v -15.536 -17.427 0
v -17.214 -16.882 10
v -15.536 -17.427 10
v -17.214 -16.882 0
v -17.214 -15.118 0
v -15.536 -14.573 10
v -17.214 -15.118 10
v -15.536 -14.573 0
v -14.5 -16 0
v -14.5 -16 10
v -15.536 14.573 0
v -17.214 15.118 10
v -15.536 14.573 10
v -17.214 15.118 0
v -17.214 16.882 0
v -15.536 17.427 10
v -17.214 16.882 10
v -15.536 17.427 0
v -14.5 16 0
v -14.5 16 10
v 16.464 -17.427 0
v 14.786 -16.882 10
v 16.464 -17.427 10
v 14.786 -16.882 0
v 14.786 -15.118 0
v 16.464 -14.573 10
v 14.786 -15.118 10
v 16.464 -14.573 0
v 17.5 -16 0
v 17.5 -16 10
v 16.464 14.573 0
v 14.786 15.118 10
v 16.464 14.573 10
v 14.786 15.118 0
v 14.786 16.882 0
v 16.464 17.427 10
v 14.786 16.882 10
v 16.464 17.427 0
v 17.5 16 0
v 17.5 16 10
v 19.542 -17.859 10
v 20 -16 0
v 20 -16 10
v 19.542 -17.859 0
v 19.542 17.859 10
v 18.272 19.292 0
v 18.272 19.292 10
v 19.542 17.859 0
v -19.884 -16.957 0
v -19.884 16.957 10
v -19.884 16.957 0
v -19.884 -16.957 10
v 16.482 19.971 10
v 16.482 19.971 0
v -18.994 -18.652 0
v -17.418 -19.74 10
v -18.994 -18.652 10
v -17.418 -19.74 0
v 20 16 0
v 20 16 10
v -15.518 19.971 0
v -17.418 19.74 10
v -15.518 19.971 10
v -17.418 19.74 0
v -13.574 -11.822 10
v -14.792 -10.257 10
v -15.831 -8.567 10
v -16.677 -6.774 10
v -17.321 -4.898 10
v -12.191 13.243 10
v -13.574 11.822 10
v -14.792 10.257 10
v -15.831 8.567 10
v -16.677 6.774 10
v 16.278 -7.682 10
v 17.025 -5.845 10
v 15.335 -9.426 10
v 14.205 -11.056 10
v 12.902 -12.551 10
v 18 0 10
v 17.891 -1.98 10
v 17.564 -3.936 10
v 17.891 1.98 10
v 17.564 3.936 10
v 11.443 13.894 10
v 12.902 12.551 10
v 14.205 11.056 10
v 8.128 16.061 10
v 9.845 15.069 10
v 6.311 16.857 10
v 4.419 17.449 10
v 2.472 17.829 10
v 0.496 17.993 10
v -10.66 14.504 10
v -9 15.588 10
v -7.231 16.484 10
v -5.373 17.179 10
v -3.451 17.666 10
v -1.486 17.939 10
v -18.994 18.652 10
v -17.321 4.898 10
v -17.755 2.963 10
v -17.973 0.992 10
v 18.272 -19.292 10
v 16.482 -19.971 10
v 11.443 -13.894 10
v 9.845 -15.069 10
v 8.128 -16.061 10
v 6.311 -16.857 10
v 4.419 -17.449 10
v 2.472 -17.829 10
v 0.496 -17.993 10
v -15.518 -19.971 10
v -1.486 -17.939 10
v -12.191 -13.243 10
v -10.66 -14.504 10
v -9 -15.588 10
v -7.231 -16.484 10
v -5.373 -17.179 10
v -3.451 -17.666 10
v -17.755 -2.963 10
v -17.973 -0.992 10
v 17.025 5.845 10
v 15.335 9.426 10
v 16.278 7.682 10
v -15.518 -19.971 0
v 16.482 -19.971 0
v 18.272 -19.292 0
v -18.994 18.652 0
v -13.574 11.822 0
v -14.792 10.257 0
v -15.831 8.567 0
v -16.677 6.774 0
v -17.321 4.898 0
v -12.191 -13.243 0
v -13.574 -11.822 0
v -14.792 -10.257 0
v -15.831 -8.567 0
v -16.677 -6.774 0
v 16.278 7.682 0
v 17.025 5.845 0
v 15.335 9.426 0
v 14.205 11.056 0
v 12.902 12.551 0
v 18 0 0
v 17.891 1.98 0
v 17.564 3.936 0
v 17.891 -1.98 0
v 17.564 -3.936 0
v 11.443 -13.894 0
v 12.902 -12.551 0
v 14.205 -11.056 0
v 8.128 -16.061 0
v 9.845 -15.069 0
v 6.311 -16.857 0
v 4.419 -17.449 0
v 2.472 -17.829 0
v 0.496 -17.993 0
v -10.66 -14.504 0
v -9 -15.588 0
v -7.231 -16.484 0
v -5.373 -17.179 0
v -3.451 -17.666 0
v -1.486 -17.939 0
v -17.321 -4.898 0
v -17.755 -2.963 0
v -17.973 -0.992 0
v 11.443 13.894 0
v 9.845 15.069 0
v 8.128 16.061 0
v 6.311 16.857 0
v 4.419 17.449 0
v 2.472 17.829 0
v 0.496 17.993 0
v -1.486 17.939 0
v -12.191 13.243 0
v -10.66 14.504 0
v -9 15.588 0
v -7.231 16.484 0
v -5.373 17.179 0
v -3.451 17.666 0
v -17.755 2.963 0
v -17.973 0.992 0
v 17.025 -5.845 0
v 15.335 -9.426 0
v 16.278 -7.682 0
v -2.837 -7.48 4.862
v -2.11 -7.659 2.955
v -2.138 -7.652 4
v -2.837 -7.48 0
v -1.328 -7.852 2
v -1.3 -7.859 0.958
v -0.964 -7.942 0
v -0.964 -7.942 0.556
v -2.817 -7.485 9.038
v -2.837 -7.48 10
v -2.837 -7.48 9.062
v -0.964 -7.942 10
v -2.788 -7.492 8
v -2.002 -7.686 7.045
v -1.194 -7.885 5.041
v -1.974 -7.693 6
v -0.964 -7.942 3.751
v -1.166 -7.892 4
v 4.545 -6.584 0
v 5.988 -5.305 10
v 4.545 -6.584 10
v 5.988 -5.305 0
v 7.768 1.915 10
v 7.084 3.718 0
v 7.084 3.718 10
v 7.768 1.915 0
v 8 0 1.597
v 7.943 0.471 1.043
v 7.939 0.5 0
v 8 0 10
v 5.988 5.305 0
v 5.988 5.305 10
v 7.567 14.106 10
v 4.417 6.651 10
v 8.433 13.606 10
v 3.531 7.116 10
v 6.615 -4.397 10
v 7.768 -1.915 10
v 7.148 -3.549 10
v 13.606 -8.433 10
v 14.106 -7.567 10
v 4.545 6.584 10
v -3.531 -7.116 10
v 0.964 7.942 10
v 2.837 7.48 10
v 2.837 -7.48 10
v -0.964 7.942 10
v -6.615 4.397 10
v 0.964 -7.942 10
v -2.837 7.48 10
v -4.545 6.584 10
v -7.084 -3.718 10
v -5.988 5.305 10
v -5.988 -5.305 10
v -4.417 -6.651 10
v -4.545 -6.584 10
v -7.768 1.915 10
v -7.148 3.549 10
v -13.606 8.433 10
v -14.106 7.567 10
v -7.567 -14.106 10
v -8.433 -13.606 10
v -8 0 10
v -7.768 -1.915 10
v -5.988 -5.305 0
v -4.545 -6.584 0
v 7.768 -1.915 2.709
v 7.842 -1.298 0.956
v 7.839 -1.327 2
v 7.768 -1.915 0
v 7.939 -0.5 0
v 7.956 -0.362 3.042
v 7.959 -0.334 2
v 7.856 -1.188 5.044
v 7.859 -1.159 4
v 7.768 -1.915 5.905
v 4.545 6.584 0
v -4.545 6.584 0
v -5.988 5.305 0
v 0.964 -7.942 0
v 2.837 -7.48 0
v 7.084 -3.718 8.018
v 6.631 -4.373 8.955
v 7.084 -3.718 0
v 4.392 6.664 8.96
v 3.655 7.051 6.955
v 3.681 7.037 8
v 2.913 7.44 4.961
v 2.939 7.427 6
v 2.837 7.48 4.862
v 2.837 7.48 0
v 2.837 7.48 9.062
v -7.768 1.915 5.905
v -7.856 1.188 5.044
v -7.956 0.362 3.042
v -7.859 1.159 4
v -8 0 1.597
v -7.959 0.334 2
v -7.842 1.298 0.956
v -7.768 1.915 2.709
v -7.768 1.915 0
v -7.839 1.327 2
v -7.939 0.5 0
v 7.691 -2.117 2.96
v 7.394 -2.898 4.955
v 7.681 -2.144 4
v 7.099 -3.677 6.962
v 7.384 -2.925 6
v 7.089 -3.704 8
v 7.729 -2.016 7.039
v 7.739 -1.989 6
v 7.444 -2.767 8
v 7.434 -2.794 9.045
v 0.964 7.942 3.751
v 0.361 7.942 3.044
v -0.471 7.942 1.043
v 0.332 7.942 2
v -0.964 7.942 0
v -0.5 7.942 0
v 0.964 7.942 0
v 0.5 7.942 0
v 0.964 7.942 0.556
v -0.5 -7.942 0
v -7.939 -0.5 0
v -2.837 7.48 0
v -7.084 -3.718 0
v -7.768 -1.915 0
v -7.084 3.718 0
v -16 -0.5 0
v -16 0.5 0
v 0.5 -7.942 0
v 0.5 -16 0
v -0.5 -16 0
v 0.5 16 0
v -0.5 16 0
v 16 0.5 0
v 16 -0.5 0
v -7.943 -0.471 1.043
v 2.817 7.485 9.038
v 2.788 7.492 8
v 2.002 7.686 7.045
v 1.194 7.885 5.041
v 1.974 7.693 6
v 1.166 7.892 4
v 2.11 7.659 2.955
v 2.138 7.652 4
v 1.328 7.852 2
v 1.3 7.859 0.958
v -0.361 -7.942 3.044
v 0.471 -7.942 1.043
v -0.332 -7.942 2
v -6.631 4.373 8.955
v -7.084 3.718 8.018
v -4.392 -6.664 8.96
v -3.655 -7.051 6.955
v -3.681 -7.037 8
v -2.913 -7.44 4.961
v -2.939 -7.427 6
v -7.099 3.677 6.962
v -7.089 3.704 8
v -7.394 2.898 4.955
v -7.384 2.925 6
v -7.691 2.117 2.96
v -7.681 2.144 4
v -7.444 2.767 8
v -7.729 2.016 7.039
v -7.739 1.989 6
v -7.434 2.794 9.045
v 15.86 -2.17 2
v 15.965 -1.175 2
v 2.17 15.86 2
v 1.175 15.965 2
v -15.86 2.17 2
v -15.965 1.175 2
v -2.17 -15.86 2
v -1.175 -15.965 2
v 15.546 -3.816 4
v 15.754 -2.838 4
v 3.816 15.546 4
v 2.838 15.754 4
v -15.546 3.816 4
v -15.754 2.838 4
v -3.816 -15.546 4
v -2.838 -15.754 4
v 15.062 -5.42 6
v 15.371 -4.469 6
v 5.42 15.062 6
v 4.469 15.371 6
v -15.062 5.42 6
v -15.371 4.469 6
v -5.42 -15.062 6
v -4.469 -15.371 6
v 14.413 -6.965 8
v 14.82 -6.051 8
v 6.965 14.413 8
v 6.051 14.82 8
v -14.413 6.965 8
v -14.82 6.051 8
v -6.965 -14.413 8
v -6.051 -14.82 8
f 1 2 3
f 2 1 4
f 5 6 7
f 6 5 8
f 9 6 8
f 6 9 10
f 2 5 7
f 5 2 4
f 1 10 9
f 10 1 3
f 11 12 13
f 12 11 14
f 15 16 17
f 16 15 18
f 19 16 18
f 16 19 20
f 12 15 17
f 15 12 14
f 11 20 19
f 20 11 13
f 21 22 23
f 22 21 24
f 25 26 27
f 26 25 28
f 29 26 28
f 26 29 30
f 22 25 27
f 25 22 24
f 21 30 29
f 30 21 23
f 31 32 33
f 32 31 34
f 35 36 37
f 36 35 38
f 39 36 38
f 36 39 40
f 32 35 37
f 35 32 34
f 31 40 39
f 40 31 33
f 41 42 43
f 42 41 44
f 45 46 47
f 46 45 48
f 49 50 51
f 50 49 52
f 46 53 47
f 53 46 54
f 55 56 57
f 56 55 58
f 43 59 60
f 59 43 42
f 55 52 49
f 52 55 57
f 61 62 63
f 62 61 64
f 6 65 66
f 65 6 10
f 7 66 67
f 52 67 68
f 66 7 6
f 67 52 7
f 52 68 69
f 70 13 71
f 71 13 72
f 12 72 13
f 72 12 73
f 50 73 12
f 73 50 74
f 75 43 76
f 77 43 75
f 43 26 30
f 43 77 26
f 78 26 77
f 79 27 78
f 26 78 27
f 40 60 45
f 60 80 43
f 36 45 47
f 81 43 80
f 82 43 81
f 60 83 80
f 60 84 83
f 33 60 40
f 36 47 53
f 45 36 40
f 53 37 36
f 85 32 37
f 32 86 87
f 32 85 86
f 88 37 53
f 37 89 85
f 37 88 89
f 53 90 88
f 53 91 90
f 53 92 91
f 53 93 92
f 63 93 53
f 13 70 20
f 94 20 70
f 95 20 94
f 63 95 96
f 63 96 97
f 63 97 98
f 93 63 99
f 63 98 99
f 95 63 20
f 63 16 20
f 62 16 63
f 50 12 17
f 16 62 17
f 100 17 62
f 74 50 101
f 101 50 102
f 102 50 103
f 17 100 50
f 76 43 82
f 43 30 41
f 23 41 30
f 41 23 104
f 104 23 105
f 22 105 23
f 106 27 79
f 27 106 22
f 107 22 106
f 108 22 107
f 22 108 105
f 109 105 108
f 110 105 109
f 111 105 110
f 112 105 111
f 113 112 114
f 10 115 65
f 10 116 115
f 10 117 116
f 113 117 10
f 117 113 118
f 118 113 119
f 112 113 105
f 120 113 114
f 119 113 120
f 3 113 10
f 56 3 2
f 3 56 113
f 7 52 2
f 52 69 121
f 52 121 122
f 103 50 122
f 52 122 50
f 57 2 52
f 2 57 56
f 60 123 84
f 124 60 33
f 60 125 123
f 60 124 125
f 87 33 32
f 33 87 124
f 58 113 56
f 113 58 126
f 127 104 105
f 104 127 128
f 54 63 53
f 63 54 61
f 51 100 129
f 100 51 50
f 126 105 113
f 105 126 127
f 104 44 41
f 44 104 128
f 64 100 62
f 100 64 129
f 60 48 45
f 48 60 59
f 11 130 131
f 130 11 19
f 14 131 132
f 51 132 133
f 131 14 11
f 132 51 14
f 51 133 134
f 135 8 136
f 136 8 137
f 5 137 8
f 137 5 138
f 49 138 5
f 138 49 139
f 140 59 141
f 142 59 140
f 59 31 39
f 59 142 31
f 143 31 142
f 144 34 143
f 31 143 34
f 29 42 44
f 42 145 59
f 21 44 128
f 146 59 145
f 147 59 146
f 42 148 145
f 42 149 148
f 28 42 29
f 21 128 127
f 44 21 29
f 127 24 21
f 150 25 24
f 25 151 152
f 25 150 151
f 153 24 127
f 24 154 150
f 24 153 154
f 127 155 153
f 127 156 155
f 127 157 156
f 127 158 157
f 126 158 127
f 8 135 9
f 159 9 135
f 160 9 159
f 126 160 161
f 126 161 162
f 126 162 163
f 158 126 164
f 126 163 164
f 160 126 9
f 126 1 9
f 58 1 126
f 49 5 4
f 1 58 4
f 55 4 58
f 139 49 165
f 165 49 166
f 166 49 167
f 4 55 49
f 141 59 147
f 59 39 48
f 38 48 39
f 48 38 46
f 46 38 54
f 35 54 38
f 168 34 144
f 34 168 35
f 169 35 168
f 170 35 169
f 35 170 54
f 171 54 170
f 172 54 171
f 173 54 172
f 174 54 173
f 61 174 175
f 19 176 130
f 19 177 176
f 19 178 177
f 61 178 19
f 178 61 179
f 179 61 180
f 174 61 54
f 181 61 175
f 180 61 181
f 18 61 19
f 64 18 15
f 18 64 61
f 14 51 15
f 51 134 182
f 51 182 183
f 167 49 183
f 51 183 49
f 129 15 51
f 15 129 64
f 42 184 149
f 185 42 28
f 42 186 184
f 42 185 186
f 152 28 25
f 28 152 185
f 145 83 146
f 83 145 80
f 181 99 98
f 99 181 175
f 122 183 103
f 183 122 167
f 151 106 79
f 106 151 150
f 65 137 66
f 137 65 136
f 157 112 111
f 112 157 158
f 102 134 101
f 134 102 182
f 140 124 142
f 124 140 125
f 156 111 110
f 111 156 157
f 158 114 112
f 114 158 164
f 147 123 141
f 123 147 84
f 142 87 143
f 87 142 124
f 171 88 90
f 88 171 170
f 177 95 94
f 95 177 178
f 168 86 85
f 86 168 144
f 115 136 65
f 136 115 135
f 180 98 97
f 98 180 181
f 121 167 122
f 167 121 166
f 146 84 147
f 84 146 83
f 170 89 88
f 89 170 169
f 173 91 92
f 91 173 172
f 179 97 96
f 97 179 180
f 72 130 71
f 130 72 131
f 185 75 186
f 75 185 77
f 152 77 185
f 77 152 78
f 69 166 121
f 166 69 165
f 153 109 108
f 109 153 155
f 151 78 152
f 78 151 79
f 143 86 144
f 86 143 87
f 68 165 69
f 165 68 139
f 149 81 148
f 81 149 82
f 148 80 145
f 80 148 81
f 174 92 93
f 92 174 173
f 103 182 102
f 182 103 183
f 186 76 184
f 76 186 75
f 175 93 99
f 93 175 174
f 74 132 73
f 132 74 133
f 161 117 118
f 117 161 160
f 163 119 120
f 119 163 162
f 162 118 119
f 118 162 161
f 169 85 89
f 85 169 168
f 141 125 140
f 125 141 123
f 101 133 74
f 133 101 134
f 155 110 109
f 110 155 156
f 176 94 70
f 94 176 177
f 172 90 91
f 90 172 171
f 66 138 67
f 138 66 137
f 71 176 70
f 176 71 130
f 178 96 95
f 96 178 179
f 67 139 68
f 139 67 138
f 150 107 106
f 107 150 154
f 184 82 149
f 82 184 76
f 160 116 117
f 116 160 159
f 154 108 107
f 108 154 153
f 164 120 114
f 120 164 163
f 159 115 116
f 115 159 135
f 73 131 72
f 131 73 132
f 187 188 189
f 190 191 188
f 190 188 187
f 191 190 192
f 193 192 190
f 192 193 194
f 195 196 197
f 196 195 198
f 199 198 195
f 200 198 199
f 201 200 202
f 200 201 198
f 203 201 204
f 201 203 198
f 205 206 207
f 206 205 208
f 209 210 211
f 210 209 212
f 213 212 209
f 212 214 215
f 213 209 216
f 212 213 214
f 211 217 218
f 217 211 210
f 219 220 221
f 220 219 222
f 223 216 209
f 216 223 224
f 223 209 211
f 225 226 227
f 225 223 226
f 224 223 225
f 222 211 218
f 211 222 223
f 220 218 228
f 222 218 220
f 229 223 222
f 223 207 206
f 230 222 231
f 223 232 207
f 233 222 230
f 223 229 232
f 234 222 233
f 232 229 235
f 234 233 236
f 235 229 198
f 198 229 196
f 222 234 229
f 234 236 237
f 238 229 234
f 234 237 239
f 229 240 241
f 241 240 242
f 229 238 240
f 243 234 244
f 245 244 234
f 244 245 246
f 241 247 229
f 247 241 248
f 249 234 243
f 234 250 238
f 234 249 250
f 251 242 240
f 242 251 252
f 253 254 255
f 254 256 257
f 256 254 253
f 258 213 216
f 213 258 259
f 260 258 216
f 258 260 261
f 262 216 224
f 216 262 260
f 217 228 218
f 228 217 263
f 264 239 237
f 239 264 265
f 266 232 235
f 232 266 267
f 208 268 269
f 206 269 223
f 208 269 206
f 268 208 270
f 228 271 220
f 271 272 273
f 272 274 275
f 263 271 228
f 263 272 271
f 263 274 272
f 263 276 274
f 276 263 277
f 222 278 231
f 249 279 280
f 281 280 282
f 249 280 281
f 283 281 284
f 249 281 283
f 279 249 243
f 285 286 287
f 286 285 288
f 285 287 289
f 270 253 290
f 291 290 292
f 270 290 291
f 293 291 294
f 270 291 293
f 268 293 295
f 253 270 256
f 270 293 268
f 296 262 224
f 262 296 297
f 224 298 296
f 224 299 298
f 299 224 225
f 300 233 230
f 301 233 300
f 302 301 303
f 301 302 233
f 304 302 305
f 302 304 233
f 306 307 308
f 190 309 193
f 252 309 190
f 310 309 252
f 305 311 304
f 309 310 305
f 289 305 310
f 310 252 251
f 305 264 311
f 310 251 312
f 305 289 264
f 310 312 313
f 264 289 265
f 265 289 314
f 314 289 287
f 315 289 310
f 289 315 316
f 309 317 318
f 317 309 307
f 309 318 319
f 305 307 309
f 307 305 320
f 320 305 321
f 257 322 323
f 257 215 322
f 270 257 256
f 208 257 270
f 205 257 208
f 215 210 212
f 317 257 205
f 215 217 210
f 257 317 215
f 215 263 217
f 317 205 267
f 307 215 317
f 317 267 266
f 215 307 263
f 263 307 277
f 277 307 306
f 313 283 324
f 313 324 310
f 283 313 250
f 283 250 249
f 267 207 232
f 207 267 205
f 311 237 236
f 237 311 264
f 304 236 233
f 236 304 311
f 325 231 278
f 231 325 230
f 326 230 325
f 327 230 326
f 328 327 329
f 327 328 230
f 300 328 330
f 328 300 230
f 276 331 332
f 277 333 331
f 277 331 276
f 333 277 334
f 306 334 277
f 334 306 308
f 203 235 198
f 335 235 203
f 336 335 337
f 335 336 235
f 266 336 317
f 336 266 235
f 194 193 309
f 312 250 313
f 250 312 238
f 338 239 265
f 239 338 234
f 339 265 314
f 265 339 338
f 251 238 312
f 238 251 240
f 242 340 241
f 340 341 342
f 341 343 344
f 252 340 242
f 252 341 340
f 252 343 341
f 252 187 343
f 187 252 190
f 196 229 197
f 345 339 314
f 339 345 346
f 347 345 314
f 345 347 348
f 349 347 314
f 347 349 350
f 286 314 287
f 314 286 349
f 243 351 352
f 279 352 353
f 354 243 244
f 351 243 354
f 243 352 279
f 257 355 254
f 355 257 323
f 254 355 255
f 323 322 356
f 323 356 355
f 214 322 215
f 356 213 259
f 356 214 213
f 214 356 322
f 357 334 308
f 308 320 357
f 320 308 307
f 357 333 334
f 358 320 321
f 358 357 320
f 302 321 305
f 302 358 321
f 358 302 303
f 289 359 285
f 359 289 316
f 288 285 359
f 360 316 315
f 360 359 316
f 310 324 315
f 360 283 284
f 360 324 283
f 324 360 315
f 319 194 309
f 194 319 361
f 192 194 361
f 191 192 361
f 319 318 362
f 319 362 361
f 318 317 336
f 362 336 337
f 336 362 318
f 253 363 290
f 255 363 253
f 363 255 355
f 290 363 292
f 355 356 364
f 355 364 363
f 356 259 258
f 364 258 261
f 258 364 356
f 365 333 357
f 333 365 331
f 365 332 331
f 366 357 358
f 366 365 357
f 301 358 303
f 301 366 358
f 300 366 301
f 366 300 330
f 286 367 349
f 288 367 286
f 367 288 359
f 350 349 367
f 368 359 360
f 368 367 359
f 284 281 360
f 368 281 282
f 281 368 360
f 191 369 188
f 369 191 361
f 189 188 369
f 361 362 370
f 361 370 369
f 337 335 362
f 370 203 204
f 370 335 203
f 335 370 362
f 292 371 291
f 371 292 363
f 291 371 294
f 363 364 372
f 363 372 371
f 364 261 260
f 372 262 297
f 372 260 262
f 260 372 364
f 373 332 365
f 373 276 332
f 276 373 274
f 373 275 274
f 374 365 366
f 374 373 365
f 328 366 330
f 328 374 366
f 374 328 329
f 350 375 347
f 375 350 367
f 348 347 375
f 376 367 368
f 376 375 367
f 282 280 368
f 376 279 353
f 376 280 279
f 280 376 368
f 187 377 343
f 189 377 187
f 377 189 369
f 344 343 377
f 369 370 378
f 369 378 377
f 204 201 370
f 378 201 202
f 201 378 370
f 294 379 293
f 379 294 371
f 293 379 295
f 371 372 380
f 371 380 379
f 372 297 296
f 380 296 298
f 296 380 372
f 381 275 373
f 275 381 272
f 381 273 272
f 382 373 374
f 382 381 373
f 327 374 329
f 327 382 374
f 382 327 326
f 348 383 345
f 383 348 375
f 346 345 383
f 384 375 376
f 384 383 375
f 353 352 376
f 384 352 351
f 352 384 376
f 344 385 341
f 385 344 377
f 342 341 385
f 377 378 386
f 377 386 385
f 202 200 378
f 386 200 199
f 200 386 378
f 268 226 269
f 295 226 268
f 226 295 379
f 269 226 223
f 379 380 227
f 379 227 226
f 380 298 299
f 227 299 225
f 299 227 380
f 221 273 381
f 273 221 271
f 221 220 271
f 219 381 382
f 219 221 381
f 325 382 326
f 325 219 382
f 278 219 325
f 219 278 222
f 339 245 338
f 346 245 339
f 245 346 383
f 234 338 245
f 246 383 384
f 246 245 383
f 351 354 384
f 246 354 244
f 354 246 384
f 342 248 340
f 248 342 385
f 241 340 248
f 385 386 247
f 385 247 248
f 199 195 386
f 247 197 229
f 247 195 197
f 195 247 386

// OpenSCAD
// file: ../machine.scad
/*
 * Helpers for machinging; i.e. kerf alowances
 *
 * Copyright 2013 <b@Zi.iS>
 * License CC BY 3.0
 */

include <main.scad>;

ZCUT = 0;
XOFF = 0;
YOFF = 0;

module drawing() {
	//create blueprint
	if(preview==0) {
		projection(cut=true) translate([
			XOFF,
			YOFF,
			ZCUT
		]) {
			for(i=[0:$children-1]) child(i);
		}
	} else {
		for(i=[0:$children-1]) child(i);
	}
}

module kerf_cube(
	size
) {
	translate([
		kerf/2*(1-preview),
		kerf/2*(1-preview),
		0
	]) {
		cube([
			size[0] - kerf*(1-preview),
			size[1] - kerf*(1-preview),
			size[2]
		]);
	}
}

module kerf_cylinder(
	r,
	h
) {
	cylinder(
		r = r - kerf/2*(1-preview),
		h = h
	);
}

module part(
	id,
	name
) {
	if(PART<1 || PART==id) {
		if(id>=0) echo(str("PART", id, ":", name));
		for(i=[0:$children-1]) child(i);
	}	
}
// file: ../easing.scad
/*
 * Make allowances to ensure good fit.
 *
 * Copyright 2013 <b@Zi.iS>
 * License CC BY 3.0
 */

function ease(value) = min(value*1.1, value + .2);
// file: ../epslion.scad
/*
 * Slightly offset previews to overcome rounding issues
 *
 * Copyright 2013 <b@Zi.iS>
 * License CC BY 3.0
 */

include <config.scad>;

module e(
	shift = -.1,
	size = 1.1
) {
	if(preview == 1) {
		translate([
			0,
			0,
			shift
		]) {
			scale([
				1,
				1,
				size
			]) {
				if($children>0) for (i = [0 : $children-1]) child(i);
			}
		}
	} else {
		if($children>0) for (i = [0 : $children-1]) child(i);
	}
}

function space(pitch, i) = -pitch/2 + pitch*i;
// file: ../config.scad
/*
 * Default settings
 *
 * Copyright 2013 <b@Zi.iS>
 * License CC BY 3.0
 */

preview = 1;
$fa = 6;
$fs = 2 - 1.5*(1-preview);
kerf = .2;
PART = 0; //all

// preview colors
color_steel = [.8, .8, .8];
color_wood = [.3, .3, 0];
color_print = [0, .8, 0];
color_plastic = [.7, 1, .7];
color_brass = [181/255, 166/255, 66/255];
// file: ../main.scad
/*
 * A library to make SCAD easier.
 *
 * Copyright 2013 <b@Zi.iS>
 * License CC BY 3.0
 */

include <config.scad>;
use <epslion.scad>;
use <easing.scad>;
use <machine.scad>;
// main file
/*
 * fan
 *
 * Copyright 2013 <b@Zi.iS>
 * License CC BY 3.0
 */

include <../main.scad>;

fan();

module fan(
	size = [
		40,			//width/length
		10,				//height
		32,			//bolt pitch
		3,			//bolt
	],
	id
) {
	part(id, str("Fan ", size[0], "mm"))
	color([.3,.3,.3]) {
		difference() {
			hull() {
				for(x=[0:1]) {
					for(y=[0:1]) {
						translate([
							-size[2]/2 + size[2] * x,
							-size[2]/2 + size[2] * y,
							0
						]) {
							cylinder(
								r = (size[0] - size[2])/2,
								h = size[1]
							);
						}
					}
				}
			}
			for(x=[0:1]) {
				for(y=[0:1]) {
					translate([
						-size[2]/2 + size[2] * x,
						-size[2]/2 + size[2] * y,
						0
					]) {
						e() cylinder(
							r = size[3]/2,
							h = size[1]
						);
					}
				}
			}
			e() cylinder(
				r = size[0]/2*.9,
				h = size[1]
			);
		}
	}

	color([.7,.7,.7]) {
		cylinder(
			r = size[0]/2*.4,
			h = size[1]
		);
		linear_extrude(
			twist=30,
			height =  size[1]
		) {
			square(center=true, [size[0]*.8,1]);
			square(center=true, [1, size[0]*.8]);
		}
	}
}
